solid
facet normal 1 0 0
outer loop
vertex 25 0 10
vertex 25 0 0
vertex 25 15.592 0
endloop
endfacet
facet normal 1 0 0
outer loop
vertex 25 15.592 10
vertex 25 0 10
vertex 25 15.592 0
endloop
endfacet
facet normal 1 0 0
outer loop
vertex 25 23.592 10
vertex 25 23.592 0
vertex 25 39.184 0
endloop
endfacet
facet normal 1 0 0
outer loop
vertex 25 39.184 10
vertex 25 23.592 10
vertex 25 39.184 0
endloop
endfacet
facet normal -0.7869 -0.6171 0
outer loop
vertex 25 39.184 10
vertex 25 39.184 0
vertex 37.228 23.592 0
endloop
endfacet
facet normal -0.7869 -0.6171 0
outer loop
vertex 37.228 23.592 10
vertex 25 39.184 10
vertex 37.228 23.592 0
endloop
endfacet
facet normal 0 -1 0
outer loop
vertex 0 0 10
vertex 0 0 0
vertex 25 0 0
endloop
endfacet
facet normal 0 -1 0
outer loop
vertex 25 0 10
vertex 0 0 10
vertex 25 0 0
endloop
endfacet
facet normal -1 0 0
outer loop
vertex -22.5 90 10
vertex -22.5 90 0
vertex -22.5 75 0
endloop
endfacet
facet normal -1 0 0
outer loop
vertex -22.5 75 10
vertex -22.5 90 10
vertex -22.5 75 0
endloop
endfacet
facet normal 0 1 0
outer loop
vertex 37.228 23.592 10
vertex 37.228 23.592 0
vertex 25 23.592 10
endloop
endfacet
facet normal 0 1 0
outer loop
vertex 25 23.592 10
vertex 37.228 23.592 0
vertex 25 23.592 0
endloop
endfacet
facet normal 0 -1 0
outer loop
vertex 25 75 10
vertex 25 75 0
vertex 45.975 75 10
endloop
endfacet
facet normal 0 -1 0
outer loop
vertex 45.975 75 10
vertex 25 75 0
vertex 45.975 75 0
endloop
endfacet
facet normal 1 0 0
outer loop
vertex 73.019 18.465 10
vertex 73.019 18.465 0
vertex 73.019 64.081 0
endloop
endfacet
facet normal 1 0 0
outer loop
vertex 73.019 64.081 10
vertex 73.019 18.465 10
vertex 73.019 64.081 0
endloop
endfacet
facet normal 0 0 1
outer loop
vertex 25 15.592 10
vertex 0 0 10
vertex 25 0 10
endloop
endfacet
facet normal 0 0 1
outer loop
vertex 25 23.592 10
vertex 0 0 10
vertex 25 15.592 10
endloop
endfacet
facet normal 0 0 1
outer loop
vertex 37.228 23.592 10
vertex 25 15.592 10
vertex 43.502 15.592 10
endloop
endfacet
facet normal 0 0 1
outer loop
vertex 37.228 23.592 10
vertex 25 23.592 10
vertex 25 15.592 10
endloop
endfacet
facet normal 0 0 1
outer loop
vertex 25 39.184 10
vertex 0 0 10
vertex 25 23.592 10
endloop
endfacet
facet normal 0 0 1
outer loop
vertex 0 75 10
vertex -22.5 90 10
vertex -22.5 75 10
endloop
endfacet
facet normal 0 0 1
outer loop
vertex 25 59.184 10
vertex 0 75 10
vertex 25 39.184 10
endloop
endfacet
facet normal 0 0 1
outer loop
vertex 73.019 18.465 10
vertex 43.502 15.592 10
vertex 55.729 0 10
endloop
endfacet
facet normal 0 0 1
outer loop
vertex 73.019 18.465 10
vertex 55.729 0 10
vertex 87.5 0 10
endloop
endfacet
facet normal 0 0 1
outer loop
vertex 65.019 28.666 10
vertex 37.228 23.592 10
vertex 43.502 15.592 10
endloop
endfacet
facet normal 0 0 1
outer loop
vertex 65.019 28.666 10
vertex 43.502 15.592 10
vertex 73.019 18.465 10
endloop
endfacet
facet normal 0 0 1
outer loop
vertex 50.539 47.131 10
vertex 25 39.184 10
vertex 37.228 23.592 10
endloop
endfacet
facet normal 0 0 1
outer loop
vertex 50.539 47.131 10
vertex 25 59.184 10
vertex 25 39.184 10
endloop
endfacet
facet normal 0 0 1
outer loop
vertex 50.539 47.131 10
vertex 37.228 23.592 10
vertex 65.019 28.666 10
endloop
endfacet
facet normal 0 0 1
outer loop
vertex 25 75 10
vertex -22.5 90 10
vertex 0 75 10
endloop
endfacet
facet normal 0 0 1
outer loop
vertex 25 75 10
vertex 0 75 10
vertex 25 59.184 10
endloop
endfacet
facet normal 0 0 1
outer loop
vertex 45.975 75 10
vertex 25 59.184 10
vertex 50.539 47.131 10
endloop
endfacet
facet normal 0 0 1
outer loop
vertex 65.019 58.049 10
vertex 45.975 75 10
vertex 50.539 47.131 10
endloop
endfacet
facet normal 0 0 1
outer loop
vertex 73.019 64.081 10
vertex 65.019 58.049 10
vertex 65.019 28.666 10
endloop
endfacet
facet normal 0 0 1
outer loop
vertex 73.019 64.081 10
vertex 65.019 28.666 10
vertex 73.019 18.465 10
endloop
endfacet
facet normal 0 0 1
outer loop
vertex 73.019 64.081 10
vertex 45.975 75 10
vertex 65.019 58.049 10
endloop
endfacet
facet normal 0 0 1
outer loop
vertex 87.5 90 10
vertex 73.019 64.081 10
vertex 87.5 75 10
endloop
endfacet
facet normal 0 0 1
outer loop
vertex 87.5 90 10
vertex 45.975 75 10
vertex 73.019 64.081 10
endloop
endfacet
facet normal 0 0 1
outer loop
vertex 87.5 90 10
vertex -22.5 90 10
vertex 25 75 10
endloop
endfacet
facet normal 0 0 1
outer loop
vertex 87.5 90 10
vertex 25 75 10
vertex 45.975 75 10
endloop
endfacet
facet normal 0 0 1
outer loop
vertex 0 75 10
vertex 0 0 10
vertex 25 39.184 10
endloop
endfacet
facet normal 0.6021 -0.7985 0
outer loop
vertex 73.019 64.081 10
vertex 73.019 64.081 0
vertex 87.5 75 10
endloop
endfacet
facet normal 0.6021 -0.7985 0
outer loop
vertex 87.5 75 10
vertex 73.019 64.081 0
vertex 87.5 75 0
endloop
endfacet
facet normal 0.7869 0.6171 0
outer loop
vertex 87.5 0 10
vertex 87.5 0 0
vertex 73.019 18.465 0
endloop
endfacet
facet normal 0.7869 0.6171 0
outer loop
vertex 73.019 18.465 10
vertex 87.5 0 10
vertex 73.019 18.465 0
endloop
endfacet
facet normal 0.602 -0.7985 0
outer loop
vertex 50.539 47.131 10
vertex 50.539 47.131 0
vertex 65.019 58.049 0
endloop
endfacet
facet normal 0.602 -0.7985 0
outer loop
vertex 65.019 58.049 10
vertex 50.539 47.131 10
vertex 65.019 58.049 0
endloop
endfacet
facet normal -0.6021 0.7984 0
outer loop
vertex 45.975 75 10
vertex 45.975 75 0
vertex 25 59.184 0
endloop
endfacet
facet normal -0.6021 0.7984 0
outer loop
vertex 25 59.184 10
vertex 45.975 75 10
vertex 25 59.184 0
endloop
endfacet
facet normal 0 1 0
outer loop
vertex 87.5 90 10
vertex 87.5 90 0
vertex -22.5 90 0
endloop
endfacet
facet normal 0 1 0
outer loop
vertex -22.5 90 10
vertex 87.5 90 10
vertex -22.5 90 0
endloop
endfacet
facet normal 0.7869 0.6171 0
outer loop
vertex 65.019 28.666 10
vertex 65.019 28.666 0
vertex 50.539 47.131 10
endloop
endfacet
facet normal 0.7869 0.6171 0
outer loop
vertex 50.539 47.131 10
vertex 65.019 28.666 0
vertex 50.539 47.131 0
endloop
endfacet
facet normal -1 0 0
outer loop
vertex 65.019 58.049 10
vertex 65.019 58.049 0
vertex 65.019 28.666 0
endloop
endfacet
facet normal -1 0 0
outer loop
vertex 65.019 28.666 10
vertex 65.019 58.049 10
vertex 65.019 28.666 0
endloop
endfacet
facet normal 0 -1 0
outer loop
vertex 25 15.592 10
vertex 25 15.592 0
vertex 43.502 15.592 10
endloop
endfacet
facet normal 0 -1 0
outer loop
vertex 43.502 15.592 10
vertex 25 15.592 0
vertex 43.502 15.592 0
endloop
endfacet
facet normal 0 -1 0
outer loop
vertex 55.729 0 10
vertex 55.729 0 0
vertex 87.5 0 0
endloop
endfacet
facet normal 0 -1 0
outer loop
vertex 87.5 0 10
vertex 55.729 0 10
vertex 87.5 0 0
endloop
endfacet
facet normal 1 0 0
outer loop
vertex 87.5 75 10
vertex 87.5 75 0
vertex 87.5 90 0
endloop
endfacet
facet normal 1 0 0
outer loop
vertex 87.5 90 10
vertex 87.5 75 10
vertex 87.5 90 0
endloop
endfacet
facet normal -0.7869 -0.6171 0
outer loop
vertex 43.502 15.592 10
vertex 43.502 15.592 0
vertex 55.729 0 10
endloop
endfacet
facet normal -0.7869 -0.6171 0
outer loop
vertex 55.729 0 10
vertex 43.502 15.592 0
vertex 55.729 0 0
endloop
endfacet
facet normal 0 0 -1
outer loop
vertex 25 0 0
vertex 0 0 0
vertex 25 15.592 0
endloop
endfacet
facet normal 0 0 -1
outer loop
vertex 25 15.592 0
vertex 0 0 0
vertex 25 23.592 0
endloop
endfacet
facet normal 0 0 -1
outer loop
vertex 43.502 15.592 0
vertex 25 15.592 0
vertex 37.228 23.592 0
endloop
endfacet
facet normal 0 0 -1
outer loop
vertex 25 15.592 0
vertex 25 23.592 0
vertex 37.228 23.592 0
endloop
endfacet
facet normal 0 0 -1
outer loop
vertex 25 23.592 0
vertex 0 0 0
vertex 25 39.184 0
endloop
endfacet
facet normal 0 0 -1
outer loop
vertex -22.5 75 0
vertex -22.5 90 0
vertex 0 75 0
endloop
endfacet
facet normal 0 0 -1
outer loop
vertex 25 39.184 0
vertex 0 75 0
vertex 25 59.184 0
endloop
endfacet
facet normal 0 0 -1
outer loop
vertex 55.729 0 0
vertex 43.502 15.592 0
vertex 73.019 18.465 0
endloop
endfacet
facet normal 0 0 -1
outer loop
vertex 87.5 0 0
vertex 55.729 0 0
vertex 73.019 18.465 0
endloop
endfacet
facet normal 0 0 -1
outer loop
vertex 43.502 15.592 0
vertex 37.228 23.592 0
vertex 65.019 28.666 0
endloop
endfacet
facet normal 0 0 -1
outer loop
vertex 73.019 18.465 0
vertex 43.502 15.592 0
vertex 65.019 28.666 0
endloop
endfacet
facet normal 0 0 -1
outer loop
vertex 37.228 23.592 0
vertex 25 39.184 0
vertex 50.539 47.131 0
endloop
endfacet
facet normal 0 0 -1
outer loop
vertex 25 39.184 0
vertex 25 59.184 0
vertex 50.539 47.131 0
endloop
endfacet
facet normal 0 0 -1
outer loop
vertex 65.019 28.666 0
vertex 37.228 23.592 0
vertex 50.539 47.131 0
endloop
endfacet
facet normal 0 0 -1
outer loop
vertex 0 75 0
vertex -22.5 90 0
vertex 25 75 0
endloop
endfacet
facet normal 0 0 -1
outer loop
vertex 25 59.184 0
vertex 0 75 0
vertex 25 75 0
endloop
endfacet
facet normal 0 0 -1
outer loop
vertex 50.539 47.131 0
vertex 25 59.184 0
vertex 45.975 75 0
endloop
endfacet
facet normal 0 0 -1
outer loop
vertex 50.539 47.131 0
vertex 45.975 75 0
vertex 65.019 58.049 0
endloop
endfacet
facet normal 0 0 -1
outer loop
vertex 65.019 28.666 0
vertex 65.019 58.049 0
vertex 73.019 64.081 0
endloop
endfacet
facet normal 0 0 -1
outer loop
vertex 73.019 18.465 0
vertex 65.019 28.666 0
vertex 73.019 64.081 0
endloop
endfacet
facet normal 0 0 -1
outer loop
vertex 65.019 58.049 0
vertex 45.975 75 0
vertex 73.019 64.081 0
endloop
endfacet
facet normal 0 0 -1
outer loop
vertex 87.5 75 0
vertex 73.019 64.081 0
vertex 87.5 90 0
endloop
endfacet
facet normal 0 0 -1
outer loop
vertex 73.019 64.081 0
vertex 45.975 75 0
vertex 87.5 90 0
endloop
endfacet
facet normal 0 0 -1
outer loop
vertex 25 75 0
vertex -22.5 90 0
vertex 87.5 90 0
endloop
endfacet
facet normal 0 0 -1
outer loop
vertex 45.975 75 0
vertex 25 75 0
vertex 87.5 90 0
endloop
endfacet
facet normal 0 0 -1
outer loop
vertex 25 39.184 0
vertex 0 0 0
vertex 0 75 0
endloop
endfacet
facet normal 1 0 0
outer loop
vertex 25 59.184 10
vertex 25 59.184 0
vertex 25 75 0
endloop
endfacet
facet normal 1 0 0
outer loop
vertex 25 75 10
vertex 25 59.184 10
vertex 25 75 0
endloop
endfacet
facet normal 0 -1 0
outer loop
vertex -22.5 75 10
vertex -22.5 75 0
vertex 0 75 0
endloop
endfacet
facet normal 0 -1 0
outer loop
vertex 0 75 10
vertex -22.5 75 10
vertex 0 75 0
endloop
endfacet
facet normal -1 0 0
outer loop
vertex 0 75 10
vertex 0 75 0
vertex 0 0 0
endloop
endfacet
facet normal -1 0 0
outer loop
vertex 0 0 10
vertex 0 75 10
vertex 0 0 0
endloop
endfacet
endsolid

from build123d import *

# Parameters (mm, degrees)
BOSS_EXTRUDE1_DEPTH = 10


with BuildPart() as part:
    # Sketch1 → Boss-Extrude1 (new body)
    # profile 1 of 3: a face of its own
    with BuildSketch(Plane.XY):
        Polygon((87.5, 75), (87.5, 90), (-22.5, 90), (-22.5, 75), (0, 75), (0, 0), (25, 0), (25, 39.184229931), (55.729251038, 0), (87.5, 0), (50.538942191, 47.130682941), align=None)
        Polygon((45.975310969, 75), (25, 59.184229931), (25, 75), align=None, mode=Mode.SUBTRACT)
    # profile 2 of 3: a face of its own
    with BuildSketch(Plane.XY):
        Polygon((25, 23.592114965), (25, 15.592114965), (43.501525347, 15.592114965), (37.22772569, 23.592114965), align=None)
    # profile 3 of 3: a face of its own
    with BuildSketch(Plane.XY):
        Polygon((73.019471096, 18.464764189), (73.019471096, 64.081415004), (65.019471096, 58.049267937), (65.019471096, 28.665918752), align=None)
    extrude(amount=BOSS_EXTRUDE1_DEPTH)


solid = part.part
